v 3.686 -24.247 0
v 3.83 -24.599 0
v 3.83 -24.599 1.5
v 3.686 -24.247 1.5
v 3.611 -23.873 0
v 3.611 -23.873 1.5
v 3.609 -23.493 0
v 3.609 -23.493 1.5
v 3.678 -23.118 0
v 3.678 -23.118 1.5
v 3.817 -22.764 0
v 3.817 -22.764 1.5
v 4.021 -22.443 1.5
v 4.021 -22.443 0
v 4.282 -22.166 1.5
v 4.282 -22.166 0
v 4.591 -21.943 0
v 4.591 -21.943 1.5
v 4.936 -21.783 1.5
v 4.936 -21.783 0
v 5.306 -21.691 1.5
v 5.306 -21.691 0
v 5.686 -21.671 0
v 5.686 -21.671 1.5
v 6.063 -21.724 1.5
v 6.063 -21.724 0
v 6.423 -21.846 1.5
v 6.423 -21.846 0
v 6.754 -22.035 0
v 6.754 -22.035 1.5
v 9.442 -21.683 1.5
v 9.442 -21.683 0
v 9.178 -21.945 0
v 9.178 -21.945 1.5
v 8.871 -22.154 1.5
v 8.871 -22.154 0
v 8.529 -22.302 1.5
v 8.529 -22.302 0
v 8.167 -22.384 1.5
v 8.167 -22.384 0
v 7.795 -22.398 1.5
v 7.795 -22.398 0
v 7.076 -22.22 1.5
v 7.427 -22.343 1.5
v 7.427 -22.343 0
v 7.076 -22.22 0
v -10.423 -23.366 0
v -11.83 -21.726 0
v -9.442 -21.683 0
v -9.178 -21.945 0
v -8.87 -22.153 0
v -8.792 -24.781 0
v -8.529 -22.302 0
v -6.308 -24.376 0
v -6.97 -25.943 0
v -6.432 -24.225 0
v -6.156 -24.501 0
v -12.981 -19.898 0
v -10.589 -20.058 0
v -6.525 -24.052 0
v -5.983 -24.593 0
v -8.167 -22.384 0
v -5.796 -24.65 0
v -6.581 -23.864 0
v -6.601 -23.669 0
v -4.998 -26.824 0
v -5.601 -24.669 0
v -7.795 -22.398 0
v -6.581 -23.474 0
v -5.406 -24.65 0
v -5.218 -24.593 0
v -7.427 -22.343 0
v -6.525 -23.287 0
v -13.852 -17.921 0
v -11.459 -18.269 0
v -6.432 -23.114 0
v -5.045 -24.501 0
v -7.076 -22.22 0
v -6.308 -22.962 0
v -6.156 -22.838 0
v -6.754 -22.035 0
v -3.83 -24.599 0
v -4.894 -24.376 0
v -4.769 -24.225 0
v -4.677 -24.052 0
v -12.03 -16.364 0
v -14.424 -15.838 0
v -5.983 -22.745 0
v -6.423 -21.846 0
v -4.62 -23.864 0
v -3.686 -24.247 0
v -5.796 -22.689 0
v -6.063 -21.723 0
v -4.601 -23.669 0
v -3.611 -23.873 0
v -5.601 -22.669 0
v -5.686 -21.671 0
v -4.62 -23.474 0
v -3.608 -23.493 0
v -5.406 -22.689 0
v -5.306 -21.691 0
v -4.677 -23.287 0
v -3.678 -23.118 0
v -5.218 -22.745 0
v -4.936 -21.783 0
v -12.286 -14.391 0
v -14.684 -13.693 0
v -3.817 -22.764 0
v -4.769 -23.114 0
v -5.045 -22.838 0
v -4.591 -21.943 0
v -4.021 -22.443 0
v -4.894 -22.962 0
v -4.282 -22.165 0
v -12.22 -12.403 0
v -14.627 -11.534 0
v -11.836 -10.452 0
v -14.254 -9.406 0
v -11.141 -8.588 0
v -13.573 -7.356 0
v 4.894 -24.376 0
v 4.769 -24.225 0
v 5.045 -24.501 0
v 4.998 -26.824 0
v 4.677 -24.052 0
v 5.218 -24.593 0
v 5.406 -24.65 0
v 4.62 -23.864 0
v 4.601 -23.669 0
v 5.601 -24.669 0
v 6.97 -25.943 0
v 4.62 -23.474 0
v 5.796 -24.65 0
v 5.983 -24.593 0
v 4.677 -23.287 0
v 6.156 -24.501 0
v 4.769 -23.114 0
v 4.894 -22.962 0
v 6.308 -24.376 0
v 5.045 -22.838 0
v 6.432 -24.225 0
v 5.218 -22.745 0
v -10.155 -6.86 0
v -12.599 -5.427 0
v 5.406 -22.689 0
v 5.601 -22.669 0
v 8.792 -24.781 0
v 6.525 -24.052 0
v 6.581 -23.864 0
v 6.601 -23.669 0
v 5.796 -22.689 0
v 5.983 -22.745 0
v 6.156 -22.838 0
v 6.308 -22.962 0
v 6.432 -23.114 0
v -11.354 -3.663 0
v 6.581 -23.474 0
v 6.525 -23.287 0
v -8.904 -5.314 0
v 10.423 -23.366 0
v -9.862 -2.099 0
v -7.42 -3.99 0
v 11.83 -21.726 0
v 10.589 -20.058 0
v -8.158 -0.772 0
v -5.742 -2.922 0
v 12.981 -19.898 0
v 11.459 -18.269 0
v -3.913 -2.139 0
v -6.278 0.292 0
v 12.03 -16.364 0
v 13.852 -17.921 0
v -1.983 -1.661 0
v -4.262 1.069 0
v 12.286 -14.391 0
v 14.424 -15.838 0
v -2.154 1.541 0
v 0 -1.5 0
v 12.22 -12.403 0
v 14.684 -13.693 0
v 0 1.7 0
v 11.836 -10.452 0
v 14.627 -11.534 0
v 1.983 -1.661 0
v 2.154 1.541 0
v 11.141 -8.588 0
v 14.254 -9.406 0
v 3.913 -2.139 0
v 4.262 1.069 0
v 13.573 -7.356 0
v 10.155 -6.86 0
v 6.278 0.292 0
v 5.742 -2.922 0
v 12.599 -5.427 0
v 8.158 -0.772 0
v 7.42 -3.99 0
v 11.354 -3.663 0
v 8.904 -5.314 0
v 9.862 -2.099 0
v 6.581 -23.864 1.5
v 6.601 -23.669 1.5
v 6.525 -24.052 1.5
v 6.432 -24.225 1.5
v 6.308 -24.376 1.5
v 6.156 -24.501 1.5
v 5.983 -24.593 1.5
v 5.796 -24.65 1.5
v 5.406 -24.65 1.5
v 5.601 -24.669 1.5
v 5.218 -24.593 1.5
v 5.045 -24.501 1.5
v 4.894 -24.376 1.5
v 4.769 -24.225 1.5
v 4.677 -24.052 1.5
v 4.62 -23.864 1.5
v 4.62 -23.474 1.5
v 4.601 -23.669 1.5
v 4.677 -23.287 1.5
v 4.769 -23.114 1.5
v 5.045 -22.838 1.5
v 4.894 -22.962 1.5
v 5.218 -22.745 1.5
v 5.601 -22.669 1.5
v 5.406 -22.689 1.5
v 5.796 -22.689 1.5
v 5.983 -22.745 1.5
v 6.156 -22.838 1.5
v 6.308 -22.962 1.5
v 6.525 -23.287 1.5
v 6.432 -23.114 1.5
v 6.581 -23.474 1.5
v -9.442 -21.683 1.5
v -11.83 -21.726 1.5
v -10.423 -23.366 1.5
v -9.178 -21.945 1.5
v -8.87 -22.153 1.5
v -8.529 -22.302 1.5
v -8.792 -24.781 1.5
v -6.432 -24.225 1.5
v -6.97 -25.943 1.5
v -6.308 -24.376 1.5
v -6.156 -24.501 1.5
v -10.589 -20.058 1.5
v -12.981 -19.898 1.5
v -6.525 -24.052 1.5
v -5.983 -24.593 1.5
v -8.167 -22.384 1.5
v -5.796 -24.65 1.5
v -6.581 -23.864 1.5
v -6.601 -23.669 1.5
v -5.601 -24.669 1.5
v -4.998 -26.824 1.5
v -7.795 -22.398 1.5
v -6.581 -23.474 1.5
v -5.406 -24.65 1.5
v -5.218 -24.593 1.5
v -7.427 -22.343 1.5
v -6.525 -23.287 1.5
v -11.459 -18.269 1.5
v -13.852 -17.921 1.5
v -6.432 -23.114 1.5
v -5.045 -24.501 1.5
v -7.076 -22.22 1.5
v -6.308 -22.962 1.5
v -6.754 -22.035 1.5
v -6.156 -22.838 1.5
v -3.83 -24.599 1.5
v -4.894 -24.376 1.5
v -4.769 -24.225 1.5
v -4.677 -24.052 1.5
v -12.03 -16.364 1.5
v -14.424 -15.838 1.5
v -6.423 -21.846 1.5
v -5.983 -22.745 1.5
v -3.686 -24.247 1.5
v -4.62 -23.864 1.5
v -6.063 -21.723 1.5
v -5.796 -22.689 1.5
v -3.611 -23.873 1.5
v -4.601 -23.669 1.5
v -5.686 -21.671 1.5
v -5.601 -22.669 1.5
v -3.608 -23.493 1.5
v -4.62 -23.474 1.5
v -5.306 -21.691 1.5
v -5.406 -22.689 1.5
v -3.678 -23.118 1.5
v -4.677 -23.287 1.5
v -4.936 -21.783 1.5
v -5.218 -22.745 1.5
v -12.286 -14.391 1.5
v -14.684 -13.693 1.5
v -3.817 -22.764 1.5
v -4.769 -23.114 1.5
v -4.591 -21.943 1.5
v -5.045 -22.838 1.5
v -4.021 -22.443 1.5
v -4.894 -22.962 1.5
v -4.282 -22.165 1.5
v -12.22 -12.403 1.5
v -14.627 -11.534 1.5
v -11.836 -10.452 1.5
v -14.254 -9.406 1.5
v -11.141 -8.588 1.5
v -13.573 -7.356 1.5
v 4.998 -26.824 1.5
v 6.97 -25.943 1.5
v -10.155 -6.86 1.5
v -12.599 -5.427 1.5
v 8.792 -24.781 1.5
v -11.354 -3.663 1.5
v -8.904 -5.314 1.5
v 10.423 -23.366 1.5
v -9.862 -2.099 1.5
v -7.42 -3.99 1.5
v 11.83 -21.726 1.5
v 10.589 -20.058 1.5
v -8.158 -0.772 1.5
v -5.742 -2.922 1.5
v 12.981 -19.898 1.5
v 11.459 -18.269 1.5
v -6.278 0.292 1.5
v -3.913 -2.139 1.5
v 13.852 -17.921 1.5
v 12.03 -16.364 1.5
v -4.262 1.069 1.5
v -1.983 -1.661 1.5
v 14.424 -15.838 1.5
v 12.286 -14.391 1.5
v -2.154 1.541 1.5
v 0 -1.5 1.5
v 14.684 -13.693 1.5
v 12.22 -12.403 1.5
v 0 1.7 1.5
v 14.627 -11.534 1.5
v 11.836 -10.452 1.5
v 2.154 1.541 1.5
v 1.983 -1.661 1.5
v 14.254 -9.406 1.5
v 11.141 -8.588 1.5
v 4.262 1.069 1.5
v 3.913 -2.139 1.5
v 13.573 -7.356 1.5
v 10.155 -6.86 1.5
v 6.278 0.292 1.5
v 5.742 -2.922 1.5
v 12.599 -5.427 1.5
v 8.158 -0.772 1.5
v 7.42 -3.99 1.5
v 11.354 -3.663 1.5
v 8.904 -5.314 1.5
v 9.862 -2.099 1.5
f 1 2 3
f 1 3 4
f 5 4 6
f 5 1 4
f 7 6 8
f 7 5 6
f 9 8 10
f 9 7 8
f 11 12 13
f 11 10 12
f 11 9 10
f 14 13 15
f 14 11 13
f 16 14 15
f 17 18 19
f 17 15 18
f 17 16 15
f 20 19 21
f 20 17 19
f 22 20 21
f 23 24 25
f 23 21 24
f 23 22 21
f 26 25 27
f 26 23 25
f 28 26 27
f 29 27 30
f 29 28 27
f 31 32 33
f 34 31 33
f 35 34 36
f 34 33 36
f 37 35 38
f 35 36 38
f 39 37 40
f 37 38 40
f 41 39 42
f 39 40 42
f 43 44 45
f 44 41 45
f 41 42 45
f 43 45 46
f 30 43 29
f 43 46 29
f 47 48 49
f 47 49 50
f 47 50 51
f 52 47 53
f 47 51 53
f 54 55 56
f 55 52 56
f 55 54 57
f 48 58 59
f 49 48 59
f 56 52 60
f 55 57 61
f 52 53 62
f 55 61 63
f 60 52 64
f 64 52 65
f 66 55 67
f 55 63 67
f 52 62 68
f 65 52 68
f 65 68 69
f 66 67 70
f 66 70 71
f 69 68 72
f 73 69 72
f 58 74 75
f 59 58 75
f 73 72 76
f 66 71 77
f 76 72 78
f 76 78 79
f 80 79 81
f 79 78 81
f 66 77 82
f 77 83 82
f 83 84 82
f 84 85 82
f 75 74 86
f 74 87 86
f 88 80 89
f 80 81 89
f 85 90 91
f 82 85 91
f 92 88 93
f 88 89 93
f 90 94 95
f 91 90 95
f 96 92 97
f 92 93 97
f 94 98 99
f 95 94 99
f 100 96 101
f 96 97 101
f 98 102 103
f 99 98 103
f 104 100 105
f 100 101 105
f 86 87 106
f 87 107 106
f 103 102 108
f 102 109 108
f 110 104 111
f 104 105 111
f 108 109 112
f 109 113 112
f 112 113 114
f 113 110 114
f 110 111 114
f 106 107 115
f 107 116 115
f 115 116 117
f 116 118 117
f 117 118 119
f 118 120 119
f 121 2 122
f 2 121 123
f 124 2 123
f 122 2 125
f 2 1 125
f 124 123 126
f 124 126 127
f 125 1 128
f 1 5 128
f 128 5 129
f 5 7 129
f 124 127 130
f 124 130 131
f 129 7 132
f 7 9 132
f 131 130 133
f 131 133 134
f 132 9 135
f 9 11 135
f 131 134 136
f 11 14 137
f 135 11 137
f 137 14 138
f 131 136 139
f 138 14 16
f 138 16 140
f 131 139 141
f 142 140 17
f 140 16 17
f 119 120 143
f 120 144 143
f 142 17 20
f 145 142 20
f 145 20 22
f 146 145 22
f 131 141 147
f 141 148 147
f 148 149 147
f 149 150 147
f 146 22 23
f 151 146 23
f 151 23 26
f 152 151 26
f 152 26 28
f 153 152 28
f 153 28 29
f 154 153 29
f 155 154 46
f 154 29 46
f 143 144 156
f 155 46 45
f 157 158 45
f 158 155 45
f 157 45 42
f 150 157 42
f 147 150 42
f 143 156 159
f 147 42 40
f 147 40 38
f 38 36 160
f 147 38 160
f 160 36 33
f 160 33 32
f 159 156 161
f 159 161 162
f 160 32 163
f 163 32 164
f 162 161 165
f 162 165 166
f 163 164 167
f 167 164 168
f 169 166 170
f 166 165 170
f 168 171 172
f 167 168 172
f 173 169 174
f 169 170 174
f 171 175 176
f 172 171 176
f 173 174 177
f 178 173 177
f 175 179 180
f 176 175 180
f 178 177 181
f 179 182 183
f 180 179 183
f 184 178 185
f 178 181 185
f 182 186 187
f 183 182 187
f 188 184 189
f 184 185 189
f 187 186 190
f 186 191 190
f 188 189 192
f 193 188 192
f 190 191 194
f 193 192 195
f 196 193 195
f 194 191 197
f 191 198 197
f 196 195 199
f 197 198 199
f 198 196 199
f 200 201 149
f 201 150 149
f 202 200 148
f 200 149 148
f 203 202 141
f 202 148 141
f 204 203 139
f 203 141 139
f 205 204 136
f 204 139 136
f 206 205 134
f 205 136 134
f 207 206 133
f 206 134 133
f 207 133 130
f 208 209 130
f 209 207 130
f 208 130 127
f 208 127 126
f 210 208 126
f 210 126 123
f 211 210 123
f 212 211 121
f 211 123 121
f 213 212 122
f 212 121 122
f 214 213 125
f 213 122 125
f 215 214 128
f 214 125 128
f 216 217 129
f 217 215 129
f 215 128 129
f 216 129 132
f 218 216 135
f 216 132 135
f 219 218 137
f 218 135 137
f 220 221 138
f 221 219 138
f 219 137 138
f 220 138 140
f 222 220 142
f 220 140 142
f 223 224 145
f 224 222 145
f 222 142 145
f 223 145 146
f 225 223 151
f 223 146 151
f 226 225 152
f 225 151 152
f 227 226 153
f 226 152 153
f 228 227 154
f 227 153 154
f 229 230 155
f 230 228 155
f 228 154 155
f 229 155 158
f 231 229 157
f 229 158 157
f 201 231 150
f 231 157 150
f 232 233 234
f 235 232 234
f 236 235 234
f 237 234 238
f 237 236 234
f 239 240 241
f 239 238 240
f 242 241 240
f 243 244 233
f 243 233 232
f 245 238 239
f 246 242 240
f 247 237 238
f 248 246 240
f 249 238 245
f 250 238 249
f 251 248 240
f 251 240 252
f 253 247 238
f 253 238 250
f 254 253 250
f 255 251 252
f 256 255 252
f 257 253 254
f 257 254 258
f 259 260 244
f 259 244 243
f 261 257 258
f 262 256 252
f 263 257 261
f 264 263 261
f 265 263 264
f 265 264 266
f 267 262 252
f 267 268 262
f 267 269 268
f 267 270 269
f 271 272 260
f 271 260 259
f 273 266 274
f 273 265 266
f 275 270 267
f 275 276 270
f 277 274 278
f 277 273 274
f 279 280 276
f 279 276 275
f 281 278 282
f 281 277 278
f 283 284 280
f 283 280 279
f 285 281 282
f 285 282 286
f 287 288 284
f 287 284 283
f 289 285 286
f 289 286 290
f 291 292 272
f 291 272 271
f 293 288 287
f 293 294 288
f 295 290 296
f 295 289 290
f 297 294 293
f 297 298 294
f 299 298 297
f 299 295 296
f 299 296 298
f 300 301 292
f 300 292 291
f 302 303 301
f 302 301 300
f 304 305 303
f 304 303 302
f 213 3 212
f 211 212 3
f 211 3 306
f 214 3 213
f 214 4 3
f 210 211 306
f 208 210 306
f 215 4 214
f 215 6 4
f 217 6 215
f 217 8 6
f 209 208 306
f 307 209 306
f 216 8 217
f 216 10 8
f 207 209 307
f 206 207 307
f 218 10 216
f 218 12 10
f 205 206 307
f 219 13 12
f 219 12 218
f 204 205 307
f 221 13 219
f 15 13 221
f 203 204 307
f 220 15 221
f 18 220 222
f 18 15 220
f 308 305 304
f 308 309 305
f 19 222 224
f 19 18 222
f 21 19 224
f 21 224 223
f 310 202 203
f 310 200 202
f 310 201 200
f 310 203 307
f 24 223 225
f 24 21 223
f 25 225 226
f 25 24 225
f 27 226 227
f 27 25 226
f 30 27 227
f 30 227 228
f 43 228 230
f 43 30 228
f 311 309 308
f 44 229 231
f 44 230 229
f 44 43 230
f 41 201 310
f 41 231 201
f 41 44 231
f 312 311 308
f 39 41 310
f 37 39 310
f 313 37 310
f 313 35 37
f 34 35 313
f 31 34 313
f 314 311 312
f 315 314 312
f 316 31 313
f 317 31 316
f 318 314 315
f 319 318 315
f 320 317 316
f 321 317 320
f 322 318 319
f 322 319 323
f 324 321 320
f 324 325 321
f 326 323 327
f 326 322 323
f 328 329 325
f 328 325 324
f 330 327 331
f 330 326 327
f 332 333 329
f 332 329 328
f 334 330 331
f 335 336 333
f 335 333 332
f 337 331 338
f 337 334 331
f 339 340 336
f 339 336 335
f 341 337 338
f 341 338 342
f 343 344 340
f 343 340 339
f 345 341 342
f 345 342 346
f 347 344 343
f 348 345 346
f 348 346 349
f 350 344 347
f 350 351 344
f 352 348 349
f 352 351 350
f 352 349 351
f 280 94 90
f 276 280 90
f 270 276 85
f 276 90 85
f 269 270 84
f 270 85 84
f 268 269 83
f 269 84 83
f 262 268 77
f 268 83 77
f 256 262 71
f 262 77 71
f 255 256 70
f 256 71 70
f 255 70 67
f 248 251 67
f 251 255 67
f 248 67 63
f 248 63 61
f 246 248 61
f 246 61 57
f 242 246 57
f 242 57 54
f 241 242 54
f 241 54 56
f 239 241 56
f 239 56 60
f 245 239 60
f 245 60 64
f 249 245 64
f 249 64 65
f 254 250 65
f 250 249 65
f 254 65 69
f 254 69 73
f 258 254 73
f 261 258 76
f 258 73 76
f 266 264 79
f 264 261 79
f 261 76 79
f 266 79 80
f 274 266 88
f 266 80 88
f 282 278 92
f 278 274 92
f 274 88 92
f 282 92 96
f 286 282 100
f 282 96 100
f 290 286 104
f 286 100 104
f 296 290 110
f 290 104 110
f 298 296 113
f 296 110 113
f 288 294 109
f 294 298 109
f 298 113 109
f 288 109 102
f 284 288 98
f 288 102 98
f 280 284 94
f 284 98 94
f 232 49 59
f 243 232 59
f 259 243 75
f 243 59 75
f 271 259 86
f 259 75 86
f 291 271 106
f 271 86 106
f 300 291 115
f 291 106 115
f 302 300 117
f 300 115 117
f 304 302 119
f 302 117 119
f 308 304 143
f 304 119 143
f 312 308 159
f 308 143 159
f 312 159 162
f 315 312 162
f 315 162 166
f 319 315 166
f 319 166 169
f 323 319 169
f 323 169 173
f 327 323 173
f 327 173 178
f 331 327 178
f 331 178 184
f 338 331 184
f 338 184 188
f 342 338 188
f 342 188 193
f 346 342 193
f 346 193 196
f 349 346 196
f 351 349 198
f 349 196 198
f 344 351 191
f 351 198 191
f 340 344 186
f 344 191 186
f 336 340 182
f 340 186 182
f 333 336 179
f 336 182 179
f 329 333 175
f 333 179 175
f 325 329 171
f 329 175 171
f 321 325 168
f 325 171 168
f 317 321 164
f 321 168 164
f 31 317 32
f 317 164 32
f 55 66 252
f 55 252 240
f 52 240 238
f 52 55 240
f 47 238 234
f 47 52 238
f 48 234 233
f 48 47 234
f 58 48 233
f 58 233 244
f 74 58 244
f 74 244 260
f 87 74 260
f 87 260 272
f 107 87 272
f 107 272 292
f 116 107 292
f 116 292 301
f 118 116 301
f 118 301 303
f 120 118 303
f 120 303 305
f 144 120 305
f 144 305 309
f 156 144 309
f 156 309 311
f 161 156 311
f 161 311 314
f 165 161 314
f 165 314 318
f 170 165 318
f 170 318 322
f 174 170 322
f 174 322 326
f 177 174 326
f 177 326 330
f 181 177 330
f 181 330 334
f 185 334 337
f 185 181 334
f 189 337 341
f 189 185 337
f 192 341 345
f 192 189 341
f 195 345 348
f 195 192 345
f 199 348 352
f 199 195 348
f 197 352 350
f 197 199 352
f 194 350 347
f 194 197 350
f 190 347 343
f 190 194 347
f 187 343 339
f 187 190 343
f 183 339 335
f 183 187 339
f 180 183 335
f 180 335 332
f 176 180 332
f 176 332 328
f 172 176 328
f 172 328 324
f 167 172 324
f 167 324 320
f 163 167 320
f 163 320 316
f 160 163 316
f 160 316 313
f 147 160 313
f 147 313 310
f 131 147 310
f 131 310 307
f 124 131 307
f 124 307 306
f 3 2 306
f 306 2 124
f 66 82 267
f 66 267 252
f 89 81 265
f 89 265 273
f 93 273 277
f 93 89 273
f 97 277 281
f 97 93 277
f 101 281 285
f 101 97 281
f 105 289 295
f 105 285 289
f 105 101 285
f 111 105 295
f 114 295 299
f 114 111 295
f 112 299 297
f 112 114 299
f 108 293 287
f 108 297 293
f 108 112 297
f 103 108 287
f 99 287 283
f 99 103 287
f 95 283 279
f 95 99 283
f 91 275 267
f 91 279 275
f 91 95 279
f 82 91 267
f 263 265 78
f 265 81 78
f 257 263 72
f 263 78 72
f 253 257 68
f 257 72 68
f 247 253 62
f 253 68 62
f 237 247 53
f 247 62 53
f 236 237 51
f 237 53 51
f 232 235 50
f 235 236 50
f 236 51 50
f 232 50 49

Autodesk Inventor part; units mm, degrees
ref_plane "YZ Plane" through (0, 0, 0) normal (1, 0, 0) x (0, 1, 0)
ref_plane "XZ Plane" through (0, 0, 0) normal (0, 1, 0) x (-1, 0, 0)
sketch "Sketch1" plane through (0, 0, 0) normal (0, 0, 1) x (1, 0, 0)
  arc A0 (9.4421, -21.6827) -> (-9.4421, -21.6827) centre (0, -13.8) ccw
  line L0 (0, 15.1128) -> (0, -73.1766) projected
  line L1 (-45.5, 0) -> (45.5, 0) projected
  line L2 (-4.9645, 1.7) -> (1.5024, 1.7) construction
  arc A1 (4.998, -26.8243) -> (-4.998, -26.8243) centre (0, -13) ccw
  line L3 (0, -1.5) -> (-5.3069, -1.5) construction
  line L4 (0, -13) -> (-6.8324, -26.0157) construction
  line L5 (-6.8324, -26.0157) -> (-20.0146, -19.0959) construction
  line L6 (-5.6007, -23.6693) -> (-15.85, -18.2891) construction
  circle A2 centre (-5.6007, -23.6693) radius 1
  arc A3 (-3.8298, -24.5989) -> (-6.7537, -22.0352) centre (-5.6007, -23.6693) ccw
  arc A4 (-9.4421, -21.6827) -> (-6.7537, -22.0352) centre (-7.9068, -20.401) ccw
  line L7 (-3.8298, -24.5989) -> (-4.998, -26.8243)
  circle A5 centre (5.6007, -23.6693) radius 1
  arc A6 (6.7537, -22.0352) -> (3.8298, -24.5989) centre (5.6007, -23.6693) ccw
  arc A7 (6.7537, -22.0352) -> (9.4421, -21.6827) centre (7.9068, -20.401) ccw
  line L8 (3.8298, -24.5989) -> (4.998, -26.8243)
  point P0 (-12.9705, -19.8007)
  point P1 (6.8324, -26.0157)
  dimension "d8" = 0.8
  dimension "d38" = 3.2
  dimension "d39" = 13
  dimension "d43" = 14.7
  dimension "d45" = 2.65
  dimension "d46" = 2
  dimension "d47" = 4.998
  dimension "d48" = 2
  dimension "d49" = 2
extrude "Body" add sketch "Sketch1" along normal blind 1.5
ref_plane "Work Plane1" through (0, -13.8, 0) normal (1, 0, 0) x (0, 0, 1)
equation "\"d8\" = 0.25 * SRB1"
equation "\"d38\" = SRB1"
equation "\"d39\" = 0.5 * WD"
equation "\"d43\" = 0.5 * ND"
equation "\"d45\" = 0.5 * SRB2"
equation "\"d46\" = SD5"
equation "\"d47\" = 0.17 * ND"
equation "\"d48\" = SD5"
equation "\"d49\" = SD5"
equation "\"d2\" = SD"
equation "\"WD\" = WDMIN"
equation "\"SD\" = 1.5"
equation "\"SRB1\" = 3.2"
equation "\"ND\" = 29.4"
equation "\"SRB2\" = 5.3"
equation "\"SD5\" = 2"
equation "\"WDMIN\" = 26"
equation "\"SD6\" = 30.1"
equation "\"NND\" = 28"
equation "\"WDMAX\" = NND"
properties part number "DIN 472 - 28 x 1.5" material "Steel, Mild"
